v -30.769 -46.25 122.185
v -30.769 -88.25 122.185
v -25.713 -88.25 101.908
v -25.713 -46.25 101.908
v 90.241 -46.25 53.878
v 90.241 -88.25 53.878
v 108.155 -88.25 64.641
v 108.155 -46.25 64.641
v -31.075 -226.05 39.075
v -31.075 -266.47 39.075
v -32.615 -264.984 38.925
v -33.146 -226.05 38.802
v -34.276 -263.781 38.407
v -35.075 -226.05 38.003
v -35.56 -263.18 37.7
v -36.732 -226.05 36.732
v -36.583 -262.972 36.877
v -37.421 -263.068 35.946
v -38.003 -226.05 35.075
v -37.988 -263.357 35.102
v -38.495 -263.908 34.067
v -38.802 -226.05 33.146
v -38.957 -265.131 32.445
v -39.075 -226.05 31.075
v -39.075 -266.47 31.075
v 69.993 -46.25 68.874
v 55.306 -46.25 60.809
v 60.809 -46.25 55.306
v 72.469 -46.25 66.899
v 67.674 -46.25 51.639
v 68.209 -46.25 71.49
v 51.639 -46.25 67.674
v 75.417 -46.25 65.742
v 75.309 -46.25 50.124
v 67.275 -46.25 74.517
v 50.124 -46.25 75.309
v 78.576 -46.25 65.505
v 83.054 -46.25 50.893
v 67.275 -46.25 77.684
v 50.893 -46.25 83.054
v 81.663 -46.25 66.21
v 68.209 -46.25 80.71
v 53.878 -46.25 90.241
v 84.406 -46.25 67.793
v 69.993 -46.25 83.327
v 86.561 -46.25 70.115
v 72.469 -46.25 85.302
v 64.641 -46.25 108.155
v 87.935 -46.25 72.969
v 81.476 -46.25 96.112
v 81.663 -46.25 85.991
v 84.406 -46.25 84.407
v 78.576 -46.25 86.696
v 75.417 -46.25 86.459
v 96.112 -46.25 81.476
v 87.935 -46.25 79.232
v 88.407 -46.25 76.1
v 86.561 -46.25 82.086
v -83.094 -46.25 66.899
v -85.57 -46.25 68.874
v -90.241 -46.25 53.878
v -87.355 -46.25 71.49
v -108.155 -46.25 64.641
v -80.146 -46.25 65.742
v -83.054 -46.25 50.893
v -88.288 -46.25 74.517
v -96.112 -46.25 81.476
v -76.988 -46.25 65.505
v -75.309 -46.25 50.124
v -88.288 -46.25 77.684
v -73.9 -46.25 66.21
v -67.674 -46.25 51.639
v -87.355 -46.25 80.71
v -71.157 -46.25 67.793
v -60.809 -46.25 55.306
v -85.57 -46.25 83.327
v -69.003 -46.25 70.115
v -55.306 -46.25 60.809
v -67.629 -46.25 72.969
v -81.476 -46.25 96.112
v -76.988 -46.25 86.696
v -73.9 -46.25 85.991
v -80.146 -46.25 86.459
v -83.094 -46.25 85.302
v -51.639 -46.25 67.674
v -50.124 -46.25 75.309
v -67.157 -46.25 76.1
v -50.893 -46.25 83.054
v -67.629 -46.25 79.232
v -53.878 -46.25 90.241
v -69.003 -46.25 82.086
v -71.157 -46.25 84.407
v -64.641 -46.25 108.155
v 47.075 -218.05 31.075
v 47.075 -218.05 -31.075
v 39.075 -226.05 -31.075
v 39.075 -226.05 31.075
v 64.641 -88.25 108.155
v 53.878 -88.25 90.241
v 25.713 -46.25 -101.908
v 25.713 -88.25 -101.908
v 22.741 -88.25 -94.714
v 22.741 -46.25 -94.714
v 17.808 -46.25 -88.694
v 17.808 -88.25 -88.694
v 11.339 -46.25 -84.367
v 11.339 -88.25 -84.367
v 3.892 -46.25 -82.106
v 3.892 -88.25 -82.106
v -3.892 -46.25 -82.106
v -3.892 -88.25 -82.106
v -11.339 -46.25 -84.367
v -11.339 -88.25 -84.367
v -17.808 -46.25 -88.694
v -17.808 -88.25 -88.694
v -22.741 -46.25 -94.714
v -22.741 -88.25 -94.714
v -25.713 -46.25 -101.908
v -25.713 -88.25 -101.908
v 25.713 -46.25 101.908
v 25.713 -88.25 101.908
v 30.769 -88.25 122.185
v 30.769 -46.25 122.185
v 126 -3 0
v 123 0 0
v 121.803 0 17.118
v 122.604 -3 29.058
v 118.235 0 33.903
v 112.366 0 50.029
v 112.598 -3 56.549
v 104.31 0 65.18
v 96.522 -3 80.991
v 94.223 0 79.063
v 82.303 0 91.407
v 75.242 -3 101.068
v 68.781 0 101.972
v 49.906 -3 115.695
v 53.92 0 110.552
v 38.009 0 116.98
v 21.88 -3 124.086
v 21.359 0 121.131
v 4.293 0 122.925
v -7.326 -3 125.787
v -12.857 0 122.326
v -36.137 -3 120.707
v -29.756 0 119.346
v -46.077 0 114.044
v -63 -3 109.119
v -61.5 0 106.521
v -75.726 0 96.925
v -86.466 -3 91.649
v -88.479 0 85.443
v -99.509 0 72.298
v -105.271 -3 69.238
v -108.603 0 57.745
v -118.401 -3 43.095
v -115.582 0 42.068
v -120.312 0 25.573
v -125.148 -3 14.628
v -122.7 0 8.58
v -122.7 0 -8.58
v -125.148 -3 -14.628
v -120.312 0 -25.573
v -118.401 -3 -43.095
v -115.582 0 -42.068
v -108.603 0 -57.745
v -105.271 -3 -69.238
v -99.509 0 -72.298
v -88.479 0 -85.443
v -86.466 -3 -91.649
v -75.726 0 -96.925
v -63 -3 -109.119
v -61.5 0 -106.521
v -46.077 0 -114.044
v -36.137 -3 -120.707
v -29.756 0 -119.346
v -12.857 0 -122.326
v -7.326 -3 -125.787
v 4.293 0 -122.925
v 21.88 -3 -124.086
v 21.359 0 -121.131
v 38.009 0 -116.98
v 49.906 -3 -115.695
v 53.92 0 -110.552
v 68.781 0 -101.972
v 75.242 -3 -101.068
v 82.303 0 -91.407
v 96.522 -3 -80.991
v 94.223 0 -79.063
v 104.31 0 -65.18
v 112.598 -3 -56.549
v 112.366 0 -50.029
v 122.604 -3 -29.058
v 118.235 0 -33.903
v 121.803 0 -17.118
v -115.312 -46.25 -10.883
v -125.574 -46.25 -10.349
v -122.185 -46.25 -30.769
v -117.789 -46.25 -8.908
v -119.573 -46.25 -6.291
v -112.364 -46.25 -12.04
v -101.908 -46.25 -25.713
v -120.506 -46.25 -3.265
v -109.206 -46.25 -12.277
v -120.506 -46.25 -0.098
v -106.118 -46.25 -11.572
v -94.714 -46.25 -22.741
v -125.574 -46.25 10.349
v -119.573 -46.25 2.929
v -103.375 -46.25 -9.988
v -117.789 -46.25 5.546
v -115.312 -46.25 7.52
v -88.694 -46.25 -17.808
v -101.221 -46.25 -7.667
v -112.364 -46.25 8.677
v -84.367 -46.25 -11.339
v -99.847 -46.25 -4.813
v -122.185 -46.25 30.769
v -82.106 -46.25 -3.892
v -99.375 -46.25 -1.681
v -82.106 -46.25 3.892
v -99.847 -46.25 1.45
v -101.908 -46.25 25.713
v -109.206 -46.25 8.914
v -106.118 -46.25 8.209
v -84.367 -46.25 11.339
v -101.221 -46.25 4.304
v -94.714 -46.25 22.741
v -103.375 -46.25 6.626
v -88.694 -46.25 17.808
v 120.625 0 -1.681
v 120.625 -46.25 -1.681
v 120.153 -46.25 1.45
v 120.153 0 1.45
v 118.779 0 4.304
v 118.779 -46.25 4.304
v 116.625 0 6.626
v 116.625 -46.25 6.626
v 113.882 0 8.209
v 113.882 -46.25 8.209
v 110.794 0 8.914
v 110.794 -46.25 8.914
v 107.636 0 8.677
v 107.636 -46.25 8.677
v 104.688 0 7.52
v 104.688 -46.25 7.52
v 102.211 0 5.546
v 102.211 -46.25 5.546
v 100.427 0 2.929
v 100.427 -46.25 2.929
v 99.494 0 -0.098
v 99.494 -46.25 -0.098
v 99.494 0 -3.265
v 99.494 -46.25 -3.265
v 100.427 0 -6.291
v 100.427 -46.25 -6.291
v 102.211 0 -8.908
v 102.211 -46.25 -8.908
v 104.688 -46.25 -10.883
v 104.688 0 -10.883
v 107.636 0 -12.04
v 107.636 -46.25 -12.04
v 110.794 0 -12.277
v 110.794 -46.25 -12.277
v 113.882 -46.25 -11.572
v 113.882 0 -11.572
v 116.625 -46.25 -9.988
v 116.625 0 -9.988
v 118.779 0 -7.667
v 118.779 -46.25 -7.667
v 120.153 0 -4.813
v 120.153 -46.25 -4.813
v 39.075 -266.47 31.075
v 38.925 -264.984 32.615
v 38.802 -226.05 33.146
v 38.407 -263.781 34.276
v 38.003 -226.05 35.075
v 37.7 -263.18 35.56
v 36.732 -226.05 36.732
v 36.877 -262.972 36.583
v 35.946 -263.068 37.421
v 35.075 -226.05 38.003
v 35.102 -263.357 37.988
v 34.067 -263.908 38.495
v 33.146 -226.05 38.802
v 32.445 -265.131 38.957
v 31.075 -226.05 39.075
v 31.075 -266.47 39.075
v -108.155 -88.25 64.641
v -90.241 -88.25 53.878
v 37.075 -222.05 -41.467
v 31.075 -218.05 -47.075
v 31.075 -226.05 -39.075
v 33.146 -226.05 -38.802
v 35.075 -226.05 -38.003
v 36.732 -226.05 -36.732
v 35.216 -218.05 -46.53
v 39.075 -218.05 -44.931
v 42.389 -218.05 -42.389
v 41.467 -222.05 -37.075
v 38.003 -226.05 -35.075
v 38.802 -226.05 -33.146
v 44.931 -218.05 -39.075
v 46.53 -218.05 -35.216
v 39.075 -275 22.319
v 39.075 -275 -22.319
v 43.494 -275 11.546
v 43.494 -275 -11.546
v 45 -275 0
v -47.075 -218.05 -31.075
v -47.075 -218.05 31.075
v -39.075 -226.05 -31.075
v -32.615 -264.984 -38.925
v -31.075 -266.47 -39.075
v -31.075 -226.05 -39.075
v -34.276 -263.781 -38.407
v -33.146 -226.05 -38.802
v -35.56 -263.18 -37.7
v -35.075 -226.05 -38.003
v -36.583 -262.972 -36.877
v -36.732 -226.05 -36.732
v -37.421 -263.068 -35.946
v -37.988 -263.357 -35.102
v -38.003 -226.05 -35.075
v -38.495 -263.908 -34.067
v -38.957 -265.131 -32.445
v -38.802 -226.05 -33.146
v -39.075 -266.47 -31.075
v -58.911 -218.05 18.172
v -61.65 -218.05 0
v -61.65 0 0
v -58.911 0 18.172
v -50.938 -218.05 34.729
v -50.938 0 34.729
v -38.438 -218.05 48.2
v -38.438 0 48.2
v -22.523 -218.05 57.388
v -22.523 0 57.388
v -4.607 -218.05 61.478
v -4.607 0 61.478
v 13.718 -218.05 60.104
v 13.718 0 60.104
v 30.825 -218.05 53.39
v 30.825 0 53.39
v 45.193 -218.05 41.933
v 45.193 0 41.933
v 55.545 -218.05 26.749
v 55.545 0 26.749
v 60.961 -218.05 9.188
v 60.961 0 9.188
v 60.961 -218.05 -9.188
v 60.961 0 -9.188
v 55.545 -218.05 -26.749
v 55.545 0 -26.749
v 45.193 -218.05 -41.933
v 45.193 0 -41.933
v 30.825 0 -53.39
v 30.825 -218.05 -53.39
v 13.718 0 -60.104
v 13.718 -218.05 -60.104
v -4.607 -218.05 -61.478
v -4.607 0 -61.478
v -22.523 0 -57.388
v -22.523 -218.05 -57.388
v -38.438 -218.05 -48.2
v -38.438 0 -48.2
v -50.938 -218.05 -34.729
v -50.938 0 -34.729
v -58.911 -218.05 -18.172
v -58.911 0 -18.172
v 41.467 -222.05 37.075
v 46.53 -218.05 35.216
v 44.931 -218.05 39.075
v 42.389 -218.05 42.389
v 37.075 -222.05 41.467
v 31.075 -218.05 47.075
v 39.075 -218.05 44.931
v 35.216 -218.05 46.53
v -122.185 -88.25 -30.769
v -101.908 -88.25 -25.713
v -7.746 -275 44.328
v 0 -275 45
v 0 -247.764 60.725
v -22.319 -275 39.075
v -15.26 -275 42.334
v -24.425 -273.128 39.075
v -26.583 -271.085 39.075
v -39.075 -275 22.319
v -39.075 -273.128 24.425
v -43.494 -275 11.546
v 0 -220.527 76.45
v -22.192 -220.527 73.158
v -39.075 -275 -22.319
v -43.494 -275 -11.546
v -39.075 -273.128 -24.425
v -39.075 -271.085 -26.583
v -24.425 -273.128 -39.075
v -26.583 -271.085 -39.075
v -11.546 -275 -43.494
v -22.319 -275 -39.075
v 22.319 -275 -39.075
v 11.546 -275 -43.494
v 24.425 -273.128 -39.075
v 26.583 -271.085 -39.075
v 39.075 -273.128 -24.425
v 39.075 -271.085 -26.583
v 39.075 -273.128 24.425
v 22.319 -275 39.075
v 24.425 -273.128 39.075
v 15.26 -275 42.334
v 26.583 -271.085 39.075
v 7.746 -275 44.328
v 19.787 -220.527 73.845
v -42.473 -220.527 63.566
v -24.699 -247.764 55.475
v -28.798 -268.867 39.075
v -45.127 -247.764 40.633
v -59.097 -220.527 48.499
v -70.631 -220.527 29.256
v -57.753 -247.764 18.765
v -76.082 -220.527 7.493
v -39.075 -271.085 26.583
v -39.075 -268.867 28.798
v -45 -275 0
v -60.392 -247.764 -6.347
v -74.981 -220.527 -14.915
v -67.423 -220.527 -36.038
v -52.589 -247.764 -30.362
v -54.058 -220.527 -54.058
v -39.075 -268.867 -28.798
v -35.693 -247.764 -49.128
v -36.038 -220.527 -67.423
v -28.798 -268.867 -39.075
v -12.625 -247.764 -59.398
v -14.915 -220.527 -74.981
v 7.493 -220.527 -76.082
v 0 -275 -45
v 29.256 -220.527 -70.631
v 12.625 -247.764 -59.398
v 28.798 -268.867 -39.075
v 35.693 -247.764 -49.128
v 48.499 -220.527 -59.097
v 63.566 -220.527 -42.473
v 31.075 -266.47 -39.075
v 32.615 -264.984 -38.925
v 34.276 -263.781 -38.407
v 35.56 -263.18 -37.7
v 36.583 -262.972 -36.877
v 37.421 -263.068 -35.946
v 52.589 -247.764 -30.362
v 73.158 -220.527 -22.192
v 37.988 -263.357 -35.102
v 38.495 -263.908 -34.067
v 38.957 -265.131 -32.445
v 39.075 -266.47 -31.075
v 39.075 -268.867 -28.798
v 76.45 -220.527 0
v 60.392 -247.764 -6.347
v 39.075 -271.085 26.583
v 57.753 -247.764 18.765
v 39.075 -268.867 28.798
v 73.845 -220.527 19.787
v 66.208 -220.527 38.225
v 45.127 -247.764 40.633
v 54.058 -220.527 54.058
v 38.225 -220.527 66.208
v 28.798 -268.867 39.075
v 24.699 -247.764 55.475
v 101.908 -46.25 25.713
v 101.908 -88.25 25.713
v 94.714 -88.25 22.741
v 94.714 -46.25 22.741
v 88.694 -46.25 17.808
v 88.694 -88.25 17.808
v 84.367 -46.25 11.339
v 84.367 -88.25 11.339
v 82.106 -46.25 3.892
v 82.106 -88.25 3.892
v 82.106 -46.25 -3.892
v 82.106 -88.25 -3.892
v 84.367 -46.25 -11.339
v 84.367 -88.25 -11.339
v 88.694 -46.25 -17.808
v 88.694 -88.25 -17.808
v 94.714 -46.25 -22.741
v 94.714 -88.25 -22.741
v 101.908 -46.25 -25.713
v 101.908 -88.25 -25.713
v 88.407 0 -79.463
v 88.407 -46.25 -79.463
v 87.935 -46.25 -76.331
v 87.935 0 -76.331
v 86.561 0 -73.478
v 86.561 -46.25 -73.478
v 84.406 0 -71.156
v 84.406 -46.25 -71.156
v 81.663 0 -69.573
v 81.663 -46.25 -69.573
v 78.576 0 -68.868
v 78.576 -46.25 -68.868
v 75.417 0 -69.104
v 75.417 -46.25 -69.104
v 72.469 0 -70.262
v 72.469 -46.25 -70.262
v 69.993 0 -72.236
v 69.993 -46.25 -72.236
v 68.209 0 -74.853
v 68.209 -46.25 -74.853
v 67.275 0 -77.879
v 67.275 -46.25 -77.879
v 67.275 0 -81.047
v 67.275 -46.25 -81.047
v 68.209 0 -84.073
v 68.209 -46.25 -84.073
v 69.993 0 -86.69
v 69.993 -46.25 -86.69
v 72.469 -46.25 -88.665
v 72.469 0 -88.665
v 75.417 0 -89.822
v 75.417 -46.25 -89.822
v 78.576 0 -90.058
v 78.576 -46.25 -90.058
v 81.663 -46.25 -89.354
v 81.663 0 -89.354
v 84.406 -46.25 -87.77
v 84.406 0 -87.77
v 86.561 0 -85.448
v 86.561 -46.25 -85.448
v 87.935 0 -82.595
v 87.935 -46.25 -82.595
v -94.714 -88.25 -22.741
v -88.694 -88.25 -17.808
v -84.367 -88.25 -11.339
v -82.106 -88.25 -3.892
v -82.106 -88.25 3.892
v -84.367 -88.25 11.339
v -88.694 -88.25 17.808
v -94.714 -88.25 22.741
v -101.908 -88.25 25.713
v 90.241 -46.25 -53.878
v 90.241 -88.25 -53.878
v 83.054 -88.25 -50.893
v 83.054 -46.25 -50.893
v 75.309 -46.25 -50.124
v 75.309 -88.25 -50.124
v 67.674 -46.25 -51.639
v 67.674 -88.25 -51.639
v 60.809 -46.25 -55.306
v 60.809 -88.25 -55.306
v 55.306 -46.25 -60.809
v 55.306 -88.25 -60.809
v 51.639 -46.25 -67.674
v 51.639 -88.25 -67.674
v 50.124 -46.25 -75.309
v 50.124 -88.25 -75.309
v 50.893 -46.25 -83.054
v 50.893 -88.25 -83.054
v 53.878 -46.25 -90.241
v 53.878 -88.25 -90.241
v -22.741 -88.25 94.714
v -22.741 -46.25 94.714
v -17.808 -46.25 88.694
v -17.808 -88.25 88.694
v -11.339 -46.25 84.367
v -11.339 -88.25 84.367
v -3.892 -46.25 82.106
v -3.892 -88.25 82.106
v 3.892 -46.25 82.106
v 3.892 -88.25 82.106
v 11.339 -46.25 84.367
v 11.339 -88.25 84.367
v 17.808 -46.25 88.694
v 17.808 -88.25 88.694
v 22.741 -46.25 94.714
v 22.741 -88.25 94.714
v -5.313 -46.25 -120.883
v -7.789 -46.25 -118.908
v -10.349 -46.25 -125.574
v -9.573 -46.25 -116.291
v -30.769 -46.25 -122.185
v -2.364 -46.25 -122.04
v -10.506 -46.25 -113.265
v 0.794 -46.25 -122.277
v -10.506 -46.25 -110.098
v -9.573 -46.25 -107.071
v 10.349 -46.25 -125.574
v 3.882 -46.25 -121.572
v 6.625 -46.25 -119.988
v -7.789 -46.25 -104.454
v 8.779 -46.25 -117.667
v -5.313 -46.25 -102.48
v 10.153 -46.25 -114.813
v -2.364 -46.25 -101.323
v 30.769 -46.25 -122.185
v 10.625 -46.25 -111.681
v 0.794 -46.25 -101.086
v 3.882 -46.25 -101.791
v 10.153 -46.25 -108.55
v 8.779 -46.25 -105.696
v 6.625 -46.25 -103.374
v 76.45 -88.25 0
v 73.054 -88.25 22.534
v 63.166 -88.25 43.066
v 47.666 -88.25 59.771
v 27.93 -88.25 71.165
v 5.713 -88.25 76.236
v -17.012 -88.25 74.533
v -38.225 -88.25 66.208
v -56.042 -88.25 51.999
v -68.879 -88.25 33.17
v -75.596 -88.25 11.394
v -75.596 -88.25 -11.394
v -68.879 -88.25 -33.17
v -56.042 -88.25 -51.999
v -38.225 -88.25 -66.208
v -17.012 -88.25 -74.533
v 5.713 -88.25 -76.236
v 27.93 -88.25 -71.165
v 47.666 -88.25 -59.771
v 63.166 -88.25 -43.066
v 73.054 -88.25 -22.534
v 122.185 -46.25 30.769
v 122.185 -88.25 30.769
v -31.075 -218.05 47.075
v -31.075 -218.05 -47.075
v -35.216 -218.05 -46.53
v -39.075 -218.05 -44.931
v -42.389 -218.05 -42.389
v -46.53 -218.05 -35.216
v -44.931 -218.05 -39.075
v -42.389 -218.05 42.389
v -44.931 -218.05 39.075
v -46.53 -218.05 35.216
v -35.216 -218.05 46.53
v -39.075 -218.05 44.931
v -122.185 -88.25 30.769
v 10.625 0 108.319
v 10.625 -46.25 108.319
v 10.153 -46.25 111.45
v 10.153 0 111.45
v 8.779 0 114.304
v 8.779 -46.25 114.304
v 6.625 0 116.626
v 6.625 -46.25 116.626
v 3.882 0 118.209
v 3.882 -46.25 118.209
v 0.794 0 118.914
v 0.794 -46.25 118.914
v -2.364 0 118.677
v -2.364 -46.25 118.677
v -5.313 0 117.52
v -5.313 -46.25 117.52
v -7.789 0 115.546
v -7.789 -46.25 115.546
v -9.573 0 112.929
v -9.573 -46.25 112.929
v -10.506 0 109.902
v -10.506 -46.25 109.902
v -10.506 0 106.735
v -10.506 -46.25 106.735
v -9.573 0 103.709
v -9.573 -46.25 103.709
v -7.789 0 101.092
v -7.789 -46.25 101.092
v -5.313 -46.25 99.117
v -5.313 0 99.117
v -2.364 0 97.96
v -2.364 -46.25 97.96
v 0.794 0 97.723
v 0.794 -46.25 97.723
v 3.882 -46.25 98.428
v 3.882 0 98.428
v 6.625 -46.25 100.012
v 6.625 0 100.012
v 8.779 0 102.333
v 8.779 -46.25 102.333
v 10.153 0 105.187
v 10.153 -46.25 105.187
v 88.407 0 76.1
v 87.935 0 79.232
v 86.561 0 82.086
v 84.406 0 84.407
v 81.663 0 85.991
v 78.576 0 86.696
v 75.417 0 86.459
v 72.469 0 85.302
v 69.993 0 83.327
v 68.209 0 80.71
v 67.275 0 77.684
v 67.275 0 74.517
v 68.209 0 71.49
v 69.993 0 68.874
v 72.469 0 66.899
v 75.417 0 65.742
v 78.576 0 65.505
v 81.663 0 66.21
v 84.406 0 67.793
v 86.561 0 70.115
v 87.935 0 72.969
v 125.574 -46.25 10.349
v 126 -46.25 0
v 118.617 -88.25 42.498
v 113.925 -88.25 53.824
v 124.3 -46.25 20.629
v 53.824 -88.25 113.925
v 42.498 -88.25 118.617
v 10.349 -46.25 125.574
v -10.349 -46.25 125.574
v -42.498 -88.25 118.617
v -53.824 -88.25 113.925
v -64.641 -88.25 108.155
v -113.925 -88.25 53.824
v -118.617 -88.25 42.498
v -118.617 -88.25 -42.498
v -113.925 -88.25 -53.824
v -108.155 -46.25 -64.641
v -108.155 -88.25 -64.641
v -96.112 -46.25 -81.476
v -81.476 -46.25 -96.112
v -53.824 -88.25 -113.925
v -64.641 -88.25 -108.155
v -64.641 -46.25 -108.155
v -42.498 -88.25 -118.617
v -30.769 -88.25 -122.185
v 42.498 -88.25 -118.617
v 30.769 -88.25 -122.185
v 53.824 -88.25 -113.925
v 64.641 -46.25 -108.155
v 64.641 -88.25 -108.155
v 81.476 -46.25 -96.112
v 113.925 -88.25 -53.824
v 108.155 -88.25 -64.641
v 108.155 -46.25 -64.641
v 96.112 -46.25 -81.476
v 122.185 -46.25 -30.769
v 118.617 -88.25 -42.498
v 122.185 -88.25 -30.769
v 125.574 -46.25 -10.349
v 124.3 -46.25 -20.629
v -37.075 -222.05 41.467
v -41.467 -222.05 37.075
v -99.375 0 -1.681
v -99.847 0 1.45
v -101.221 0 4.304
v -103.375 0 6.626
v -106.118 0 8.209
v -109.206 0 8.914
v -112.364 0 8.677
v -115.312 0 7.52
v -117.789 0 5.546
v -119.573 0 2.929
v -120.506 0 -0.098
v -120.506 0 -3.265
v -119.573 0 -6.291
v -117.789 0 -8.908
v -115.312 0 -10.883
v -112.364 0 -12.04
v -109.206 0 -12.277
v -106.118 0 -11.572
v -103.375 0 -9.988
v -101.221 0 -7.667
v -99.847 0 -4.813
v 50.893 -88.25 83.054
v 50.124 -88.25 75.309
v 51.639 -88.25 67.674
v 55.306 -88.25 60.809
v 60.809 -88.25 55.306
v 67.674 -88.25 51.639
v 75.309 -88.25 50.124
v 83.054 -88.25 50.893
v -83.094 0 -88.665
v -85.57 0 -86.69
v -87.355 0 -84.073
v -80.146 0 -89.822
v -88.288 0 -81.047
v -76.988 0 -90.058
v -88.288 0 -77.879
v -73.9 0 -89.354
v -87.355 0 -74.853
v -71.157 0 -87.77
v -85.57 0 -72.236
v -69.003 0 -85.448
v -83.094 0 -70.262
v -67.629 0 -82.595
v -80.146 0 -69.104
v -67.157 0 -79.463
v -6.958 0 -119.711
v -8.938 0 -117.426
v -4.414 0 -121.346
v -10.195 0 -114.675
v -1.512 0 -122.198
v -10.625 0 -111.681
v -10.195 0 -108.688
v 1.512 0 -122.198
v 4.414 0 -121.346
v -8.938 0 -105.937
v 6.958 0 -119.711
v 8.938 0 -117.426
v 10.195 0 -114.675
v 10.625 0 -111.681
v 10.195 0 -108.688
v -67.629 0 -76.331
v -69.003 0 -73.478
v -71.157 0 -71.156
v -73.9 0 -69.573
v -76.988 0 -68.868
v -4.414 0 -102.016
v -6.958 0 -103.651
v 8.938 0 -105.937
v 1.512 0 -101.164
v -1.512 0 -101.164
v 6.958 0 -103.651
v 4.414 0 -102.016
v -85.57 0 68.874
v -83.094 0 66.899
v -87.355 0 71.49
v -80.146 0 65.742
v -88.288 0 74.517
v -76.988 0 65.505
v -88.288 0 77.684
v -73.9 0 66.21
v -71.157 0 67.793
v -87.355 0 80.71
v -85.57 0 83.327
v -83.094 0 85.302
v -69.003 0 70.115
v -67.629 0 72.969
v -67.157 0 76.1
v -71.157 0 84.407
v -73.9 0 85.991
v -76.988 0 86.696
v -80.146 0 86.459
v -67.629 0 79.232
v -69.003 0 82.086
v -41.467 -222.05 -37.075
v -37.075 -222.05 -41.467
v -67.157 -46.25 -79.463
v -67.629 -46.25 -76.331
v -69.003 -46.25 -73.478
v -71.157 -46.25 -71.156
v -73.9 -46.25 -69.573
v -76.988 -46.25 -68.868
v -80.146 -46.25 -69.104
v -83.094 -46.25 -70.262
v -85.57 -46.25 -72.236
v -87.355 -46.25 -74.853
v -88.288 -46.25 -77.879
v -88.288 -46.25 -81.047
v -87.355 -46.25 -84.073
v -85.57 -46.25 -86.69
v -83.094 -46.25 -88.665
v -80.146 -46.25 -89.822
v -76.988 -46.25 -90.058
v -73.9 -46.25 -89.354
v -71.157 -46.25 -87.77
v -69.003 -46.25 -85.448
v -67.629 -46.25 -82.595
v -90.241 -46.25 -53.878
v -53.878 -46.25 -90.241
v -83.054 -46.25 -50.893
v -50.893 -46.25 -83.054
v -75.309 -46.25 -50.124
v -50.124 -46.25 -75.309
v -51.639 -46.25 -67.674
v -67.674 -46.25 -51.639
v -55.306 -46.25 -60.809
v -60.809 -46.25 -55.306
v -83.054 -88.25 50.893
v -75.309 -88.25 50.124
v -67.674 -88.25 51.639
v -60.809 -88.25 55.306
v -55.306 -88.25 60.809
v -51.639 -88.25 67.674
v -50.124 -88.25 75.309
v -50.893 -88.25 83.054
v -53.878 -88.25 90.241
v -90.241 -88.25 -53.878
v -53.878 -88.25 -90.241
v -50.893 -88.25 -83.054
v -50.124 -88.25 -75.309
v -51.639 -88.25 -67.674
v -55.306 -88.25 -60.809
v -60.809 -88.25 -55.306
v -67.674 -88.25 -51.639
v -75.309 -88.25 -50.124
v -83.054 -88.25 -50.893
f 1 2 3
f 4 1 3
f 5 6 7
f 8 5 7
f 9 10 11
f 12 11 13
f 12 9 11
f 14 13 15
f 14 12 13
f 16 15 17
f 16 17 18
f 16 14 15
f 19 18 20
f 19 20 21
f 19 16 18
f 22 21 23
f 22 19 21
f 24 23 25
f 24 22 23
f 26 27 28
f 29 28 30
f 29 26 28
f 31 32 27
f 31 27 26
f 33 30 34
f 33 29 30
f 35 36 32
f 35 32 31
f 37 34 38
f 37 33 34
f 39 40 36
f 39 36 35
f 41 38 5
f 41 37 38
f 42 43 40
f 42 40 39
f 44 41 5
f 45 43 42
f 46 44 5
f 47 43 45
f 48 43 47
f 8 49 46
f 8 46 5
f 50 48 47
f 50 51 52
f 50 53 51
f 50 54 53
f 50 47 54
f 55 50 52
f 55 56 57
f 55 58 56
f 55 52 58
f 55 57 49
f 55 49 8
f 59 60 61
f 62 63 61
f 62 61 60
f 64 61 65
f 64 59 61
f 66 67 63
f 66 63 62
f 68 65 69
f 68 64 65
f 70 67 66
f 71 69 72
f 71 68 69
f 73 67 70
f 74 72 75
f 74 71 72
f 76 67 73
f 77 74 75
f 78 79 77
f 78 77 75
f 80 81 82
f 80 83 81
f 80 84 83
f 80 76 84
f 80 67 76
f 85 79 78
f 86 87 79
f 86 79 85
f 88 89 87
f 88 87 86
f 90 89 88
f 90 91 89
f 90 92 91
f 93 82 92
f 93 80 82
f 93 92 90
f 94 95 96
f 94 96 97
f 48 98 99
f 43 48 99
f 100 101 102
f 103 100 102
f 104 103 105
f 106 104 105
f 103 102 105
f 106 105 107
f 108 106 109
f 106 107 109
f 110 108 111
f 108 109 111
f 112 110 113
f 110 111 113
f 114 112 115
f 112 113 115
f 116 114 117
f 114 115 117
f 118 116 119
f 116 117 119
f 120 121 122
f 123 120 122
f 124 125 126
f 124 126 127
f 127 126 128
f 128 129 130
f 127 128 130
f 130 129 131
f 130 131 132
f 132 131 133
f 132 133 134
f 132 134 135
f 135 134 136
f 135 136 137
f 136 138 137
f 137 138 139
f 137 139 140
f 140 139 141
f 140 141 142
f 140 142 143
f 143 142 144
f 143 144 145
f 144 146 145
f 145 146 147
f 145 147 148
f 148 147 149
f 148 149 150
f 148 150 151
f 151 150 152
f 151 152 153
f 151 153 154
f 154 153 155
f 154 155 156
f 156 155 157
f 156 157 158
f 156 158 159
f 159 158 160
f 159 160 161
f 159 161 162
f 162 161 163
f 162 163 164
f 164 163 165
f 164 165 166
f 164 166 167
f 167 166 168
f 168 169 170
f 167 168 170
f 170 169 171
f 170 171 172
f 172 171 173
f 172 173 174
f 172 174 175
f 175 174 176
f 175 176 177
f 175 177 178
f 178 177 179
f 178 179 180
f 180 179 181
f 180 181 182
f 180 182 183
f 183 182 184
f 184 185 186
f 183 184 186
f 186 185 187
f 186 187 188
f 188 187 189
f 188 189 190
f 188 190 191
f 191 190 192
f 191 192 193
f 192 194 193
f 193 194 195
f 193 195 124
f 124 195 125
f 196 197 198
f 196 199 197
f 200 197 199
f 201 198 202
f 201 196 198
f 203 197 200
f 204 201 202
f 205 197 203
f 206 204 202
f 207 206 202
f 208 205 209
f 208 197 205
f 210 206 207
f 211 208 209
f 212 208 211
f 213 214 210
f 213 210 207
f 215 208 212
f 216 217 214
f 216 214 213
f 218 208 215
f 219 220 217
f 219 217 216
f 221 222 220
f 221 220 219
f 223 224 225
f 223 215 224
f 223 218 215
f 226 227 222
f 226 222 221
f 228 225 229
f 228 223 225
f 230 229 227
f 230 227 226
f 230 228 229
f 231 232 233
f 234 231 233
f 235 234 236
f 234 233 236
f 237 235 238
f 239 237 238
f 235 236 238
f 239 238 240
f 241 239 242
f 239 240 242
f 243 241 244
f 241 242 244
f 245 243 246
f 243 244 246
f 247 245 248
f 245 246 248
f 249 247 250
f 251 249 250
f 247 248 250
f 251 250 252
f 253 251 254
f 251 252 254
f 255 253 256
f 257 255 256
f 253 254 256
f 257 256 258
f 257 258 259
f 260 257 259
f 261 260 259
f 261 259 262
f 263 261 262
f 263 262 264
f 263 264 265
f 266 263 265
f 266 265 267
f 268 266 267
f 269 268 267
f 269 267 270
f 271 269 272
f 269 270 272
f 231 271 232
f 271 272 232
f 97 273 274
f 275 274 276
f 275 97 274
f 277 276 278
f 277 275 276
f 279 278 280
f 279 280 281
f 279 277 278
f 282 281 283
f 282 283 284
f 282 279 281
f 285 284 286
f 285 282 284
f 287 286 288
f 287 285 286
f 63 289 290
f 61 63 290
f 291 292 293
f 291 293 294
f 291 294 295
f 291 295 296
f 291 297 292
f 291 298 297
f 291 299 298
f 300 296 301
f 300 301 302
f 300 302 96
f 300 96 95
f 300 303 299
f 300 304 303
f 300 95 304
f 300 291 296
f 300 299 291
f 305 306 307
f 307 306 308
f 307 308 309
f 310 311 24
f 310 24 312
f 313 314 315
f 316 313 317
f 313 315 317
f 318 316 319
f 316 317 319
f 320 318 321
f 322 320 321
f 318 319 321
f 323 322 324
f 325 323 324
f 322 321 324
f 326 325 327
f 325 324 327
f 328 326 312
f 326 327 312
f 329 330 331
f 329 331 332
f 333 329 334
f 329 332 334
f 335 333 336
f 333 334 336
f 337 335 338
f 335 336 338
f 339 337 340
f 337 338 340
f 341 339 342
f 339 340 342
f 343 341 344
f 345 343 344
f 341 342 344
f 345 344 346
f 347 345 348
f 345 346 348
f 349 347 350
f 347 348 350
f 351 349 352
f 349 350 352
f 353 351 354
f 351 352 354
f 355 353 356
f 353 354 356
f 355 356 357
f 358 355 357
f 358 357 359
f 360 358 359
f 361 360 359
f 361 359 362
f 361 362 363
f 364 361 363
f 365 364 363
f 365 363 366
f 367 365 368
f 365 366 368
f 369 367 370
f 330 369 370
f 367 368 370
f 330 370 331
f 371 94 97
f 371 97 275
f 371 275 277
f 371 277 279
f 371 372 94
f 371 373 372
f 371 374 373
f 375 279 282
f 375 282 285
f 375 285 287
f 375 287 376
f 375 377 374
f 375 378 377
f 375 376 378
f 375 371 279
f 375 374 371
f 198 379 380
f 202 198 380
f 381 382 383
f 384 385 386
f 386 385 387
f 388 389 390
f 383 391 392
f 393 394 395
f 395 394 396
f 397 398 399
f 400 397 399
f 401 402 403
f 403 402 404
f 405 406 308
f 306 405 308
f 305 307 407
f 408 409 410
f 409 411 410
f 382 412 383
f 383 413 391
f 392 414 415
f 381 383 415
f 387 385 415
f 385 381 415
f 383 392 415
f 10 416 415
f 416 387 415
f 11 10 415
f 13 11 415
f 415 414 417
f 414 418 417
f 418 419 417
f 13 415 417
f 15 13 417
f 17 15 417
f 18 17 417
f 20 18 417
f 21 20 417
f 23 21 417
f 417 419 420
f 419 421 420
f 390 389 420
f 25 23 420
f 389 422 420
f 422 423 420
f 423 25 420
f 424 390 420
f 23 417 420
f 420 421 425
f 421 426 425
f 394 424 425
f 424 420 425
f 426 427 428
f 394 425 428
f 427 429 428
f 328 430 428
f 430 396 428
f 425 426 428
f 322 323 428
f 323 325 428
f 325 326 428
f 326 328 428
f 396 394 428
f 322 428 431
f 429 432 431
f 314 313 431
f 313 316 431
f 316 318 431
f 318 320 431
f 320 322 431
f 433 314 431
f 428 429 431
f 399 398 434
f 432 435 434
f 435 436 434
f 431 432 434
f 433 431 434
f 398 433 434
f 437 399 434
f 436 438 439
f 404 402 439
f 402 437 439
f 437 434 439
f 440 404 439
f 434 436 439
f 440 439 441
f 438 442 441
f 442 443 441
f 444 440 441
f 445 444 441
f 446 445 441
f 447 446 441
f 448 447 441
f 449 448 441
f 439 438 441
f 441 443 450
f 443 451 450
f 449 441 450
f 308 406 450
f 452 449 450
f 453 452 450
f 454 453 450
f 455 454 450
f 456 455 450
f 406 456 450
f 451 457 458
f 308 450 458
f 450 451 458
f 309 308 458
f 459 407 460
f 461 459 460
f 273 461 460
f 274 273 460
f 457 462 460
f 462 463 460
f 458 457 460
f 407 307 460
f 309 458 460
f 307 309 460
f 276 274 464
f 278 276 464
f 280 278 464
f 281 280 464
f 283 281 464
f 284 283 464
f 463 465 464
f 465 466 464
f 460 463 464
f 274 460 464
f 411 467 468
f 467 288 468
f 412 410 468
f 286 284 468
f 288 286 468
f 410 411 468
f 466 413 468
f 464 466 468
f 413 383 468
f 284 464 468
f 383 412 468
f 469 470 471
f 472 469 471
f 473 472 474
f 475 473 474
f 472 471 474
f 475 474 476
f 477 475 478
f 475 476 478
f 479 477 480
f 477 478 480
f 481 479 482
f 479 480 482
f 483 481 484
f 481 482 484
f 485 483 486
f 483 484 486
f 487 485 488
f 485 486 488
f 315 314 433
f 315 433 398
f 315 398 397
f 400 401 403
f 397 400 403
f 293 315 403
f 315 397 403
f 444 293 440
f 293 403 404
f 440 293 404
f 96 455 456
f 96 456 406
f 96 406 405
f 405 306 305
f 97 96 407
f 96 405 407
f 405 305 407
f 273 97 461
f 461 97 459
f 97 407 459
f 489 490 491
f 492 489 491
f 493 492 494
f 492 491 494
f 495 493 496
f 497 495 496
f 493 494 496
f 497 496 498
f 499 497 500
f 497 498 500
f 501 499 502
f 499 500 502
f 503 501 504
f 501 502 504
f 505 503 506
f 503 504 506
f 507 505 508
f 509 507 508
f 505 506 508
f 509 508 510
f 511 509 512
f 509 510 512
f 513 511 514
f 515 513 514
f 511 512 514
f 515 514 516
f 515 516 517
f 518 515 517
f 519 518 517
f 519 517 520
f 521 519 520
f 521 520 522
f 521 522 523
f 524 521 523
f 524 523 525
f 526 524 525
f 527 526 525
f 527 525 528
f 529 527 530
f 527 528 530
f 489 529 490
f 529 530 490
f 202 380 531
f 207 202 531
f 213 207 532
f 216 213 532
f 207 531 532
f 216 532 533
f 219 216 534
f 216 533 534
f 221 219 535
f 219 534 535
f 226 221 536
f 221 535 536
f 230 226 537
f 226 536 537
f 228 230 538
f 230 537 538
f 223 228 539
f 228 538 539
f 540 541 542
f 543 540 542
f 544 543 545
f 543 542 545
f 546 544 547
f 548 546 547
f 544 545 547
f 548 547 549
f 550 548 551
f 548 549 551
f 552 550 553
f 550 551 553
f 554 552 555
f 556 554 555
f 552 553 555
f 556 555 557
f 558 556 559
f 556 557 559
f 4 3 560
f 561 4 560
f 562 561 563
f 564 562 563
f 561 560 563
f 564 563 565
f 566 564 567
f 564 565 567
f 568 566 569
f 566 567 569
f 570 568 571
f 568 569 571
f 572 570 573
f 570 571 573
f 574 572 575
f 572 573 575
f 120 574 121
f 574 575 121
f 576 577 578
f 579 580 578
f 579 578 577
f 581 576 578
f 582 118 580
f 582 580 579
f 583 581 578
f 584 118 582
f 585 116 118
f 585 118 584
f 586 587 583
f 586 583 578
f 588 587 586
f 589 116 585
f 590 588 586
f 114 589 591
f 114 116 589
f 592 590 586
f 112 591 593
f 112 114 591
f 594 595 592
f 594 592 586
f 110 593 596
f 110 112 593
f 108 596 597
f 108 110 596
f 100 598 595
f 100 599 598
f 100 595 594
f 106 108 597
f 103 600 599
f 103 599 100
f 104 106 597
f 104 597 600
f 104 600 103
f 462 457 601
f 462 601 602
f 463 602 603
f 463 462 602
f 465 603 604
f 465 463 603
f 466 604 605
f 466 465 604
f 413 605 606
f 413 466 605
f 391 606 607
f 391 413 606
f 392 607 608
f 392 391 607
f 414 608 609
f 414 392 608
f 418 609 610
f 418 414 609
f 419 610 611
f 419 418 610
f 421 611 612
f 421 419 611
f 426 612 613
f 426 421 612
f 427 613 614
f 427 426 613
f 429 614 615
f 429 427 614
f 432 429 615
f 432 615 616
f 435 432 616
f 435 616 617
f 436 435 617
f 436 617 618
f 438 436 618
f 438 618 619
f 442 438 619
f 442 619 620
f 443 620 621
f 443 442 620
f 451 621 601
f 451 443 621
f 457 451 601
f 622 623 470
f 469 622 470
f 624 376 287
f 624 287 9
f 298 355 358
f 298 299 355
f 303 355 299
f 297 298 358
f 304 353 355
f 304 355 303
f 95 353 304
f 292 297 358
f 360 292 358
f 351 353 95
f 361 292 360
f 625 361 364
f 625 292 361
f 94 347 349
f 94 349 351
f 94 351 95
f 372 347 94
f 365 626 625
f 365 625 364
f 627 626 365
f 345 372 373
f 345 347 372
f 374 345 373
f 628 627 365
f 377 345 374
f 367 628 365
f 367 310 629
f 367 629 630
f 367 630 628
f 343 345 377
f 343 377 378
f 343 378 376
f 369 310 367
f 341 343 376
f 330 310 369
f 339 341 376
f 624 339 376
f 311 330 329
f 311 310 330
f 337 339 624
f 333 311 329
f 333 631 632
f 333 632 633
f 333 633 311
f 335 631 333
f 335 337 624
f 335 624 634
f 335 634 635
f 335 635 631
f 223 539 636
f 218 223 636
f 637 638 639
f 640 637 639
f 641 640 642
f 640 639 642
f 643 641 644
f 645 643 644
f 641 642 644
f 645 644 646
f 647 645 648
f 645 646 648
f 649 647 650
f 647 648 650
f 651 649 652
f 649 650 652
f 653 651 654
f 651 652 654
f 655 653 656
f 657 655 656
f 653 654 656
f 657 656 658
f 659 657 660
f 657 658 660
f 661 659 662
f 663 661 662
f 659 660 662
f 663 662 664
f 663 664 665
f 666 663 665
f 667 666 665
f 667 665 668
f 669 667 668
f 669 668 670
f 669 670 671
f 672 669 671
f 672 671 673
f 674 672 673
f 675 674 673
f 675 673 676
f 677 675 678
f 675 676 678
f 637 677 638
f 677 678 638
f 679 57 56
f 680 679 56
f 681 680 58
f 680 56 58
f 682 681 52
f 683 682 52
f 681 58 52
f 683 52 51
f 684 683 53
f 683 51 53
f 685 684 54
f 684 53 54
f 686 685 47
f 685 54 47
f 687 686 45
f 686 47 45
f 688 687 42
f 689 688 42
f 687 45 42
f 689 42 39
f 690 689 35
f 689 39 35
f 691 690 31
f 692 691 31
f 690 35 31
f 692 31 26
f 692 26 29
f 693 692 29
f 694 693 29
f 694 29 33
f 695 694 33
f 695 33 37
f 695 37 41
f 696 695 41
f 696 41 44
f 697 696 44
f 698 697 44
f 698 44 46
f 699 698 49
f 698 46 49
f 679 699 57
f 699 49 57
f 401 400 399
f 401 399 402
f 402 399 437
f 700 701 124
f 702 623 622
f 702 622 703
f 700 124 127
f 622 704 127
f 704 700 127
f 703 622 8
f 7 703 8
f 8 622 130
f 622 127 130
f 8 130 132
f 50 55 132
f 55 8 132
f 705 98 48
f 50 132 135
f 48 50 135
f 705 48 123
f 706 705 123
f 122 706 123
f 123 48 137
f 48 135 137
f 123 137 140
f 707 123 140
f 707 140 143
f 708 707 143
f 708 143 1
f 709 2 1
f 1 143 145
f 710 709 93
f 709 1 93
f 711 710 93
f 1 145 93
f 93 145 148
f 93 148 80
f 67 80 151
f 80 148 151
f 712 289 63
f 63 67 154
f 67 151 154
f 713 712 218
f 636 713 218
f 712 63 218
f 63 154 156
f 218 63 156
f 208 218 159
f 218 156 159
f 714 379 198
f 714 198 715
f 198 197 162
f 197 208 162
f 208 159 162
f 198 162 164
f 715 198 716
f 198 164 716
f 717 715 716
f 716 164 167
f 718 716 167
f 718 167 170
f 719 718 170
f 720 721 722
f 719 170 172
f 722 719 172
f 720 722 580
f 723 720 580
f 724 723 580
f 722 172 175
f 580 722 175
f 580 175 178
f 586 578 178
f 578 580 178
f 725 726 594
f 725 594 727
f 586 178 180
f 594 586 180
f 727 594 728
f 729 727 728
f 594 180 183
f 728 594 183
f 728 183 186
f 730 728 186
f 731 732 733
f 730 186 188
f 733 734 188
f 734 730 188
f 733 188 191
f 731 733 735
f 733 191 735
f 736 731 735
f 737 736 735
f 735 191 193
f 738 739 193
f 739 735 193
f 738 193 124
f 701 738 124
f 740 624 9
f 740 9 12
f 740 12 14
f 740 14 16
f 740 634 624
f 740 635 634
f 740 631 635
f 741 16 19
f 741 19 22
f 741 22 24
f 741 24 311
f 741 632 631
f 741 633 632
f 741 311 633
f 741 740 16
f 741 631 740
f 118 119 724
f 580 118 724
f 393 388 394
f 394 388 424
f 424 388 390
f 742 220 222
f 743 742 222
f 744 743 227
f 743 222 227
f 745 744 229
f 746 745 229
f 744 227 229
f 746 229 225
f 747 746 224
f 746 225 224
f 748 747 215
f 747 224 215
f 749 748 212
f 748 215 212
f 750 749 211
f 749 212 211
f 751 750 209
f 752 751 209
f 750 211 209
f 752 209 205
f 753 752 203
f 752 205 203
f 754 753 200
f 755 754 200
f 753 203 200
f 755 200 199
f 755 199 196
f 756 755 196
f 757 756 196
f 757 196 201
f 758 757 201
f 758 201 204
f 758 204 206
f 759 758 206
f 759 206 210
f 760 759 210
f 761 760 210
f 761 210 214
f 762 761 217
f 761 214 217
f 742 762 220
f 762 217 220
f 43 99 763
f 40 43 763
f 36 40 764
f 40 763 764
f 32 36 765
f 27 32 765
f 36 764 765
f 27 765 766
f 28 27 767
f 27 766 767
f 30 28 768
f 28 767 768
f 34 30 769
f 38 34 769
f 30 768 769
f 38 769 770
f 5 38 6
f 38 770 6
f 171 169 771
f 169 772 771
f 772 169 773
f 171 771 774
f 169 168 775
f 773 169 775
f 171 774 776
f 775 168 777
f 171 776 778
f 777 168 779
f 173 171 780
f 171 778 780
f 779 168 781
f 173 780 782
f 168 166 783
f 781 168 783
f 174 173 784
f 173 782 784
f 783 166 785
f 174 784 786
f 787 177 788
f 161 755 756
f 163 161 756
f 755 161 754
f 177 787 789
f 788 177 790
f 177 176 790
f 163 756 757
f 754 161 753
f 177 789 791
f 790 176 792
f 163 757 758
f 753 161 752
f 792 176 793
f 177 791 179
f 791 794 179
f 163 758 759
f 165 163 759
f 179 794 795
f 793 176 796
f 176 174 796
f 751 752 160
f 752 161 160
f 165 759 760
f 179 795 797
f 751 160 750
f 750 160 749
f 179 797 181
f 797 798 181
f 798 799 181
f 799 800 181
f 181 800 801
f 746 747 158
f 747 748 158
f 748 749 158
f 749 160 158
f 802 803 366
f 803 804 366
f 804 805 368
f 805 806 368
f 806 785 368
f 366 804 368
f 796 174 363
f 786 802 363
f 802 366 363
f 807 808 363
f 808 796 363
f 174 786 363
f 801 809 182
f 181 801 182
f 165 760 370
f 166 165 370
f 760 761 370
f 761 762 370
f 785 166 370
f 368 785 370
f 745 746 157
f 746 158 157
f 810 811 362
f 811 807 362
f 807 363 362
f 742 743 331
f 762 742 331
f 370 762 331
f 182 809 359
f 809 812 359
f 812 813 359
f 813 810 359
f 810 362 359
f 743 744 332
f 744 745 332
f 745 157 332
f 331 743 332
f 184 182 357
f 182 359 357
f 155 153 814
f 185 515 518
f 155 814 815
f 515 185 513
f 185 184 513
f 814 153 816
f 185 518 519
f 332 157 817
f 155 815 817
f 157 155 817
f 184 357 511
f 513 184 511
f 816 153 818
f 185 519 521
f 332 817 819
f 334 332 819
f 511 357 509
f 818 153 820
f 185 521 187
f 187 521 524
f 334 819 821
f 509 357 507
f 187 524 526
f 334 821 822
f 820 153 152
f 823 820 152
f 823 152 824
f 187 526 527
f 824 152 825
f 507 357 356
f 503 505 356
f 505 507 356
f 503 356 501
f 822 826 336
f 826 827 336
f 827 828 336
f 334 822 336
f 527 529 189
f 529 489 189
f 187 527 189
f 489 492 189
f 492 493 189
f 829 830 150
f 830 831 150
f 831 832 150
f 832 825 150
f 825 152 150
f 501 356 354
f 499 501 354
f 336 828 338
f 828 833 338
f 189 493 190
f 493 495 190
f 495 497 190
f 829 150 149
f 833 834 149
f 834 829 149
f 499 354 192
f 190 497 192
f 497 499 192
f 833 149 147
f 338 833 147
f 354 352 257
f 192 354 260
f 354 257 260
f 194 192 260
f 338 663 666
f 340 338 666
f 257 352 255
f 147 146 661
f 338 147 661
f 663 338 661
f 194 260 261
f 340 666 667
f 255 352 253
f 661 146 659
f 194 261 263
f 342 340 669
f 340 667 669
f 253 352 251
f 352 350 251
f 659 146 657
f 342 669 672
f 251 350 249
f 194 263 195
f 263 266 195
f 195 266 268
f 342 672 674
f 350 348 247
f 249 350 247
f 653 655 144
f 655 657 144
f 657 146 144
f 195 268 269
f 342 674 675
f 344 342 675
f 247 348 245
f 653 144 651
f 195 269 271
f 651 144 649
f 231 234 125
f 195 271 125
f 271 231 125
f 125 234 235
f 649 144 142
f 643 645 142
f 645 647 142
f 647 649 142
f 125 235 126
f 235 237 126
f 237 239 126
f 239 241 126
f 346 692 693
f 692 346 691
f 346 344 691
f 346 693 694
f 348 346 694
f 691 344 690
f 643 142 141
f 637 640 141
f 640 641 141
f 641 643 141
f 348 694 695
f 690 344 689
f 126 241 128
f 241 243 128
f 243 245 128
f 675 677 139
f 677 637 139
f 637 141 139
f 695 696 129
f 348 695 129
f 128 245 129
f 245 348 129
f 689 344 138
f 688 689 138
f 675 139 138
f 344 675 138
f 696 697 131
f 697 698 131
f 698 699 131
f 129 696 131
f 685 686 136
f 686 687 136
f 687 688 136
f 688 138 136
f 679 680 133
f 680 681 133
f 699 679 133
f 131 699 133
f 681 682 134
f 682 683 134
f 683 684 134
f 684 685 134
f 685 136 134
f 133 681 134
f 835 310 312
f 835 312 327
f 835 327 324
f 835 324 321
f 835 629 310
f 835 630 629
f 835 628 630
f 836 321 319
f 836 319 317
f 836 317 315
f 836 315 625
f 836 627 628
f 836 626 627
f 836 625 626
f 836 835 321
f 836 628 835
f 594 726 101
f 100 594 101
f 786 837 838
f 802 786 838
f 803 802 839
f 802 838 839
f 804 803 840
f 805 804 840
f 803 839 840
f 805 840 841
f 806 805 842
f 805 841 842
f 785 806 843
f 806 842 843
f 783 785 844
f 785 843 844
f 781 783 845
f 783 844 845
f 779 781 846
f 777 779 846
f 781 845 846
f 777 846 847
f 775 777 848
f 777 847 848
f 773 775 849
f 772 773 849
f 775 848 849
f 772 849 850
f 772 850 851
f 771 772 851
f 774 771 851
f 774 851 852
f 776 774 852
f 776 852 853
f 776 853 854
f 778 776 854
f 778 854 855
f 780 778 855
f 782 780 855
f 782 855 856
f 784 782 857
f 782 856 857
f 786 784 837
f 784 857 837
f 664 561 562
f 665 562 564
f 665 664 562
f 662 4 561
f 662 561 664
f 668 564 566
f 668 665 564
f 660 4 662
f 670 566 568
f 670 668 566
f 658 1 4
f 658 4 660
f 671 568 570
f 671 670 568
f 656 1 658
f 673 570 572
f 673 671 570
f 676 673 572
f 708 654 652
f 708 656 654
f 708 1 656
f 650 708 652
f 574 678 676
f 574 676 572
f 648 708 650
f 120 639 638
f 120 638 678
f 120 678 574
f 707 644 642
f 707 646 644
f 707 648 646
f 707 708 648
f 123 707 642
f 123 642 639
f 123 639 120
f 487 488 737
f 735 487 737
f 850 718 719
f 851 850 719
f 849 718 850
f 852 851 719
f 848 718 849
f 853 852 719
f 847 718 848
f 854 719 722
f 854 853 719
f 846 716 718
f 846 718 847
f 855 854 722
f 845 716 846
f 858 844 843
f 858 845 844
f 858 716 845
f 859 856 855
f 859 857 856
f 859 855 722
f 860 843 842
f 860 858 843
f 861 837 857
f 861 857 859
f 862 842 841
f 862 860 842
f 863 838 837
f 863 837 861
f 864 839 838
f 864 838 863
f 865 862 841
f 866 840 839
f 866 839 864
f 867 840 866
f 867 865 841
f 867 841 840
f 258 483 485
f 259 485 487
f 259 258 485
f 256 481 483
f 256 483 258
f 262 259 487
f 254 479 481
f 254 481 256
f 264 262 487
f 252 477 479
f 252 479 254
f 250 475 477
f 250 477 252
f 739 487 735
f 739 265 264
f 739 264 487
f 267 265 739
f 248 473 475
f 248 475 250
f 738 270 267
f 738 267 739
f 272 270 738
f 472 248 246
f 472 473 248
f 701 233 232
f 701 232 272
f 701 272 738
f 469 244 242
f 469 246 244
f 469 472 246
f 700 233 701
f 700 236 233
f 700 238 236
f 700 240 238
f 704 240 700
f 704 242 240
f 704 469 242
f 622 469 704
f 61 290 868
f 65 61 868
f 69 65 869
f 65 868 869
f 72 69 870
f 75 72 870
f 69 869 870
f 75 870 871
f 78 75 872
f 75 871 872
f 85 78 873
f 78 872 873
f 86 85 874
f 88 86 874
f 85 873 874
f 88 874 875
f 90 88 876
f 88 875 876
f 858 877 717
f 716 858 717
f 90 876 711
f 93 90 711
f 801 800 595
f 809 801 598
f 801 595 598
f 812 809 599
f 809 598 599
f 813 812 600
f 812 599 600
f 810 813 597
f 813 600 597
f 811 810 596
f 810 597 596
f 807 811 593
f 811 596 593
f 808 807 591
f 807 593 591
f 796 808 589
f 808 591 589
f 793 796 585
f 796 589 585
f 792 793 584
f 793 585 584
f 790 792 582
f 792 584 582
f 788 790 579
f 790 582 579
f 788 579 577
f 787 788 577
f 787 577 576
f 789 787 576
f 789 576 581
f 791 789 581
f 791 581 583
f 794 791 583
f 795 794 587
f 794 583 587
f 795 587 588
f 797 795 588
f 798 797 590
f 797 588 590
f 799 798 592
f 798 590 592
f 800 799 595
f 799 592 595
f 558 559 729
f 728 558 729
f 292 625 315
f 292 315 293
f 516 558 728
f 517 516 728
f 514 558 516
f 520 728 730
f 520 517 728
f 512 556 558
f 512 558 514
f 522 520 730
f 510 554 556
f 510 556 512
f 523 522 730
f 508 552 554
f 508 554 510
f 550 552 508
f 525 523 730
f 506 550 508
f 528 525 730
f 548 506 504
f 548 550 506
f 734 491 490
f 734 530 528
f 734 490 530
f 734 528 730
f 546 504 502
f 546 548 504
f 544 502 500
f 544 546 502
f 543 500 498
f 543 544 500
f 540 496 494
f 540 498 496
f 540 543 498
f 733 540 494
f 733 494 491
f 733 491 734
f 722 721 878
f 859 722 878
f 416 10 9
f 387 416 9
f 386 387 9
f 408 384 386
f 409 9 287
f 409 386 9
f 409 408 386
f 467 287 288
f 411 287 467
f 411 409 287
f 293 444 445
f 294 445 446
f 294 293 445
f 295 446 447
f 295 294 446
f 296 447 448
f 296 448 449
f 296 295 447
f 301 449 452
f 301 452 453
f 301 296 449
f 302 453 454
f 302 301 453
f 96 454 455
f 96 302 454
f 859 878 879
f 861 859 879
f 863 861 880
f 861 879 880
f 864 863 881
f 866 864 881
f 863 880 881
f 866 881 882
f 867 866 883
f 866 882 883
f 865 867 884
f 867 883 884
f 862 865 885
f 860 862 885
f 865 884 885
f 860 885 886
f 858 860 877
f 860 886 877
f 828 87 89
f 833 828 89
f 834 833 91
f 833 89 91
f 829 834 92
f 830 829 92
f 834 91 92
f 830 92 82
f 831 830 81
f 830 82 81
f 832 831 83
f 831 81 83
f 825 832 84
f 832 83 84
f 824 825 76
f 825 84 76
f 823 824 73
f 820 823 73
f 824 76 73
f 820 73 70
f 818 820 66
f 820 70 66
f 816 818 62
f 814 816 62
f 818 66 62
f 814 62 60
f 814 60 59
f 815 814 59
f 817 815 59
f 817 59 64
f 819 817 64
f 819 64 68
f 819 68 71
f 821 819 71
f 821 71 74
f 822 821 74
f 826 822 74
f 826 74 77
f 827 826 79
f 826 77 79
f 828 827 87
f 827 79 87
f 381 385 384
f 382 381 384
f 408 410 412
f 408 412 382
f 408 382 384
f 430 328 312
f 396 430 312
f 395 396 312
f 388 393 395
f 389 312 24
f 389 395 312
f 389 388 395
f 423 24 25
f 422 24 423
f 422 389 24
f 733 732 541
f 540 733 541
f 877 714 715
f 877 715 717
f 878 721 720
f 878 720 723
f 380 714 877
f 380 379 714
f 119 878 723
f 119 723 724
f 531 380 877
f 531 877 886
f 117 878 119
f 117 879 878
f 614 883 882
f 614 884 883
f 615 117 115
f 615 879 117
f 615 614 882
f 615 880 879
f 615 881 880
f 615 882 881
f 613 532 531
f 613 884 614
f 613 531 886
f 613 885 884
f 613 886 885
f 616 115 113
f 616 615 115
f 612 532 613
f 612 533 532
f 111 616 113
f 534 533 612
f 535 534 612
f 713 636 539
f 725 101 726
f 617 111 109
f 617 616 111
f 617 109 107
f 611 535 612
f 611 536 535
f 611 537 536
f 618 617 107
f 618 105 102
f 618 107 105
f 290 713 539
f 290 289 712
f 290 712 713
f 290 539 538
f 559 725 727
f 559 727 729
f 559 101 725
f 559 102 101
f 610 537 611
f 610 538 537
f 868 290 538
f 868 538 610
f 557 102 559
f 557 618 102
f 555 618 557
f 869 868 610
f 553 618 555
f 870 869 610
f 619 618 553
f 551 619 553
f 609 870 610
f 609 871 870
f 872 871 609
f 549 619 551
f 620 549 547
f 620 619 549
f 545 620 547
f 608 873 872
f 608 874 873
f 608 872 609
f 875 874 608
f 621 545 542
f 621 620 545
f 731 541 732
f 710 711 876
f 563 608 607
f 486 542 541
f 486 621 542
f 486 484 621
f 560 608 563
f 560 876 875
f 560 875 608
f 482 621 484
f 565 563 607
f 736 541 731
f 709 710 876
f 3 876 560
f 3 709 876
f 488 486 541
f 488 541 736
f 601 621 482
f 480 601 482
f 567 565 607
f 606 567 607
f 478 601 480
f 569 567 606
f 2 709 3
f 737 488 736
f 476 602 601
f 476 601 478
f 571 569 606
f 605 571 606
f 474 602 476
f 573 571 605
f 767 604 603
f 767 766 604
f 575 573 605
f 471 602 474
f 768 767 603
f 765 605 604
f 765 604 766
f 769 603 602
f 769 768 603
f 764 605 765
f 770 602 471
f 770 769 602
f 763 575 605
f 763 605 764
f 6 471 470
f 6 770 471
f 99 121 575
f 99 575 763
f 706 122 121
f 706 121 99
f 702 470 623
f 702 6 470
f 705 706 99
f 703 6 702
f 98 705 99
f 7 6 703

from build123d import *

# Parameters (mm, degrees)
F0_R      = 126
F1_DEPTH  = 275
F2_R      = 126
F2_R_2    = 76.45
F3_DEPTH  = 186.75
F4_R      = 10.625
F5_DEPTH  = 25
F6_DEPTH  = 169
F8_DEPTH  = 42
F9_SIZE   = 3
F10_R     = 61.65
F11_DEPTH = 218.05
F14_W     = 78.15
F14_H     = 78.15
F15_DEPTH = 60
F16_R     = 8
F17_R     = 8
F18_R     = 8
F19_R     = 8
F20_SIZE  = 8


with BuildPart() as f1:
    # F0 (on Front) → F1 (new body)
    with BuildSketch(Plane.XZ):
        Circle(F0_R)
    extrude(amount=F1_DEPTH)

    # F2 (on face) → F3 (cut)
    with BuildSketch(Plane.XZ.offset(275)):
        Circle(F2_R)
        Circle(F2_R_2, mode=Mode.SUBTRACT)
    extrude(amount=-F3_DEPTH, mode=Mode.SUBTRACT)

    # F4 (on face) → F5 (cut)
    with BuildSketch(Plane.XZ.offset(88.25)):
        with Locations((0, 108.3187091187)):
            Circle(F4_R)
        with Locations((-77.7817459305, 76.1004550493)):
            Circle(F4_R)
        with Locations((-110, -1.6812908813)):
            Circle(F4_R)
        with Locations((-77.7817459305, -79.4630368118)):
            Circle(F4_R)
        with Locations((0, -111.6812908813)):
            Circle(F4_R)
        with Locations((77.7817459305, -79.4630368118)):
            Circle(F4_R)
        with Locations((110, -1.6812908813)):
            Circle(F4_R)
        with Locations((77.7817459305, 76.1004550493)):
            Circle(F4_R)
    extrude(amount=-F5_DEPTH, mode=Mode.SUBTRACT)

    # F4 (on face) → F6 (cut)
    with BuildSketch(Plane.XZ.offset(88.25)):
        with Locations((0, 108.3187091187)):
            Circle(F4_R)
        with Locations((-77.7817459305, 76.1004550493)):
            Circle(F4_R)
        with Locations((-110, -1.6812908813)):
            Circle(F4_R)
        with Locations((-77.7817459305, -79.4630368118)):
            Circle(F4_R)
        with Locations((0, -111.6812908813)):
            Circle(F4_R)
        with Locations((77.7817459305, -79.4630368118)):
            Circle(F4_R)
        with Locations((110, -1.6812908813)):
            Circle(F4_R)
        with Locations((77.7817459305, 76.1004550493)):
            Circle(F4_R)
    extrude(amount=-F6_DEPTH, mode=Mode.SUBTRACT)

    # F7 (on face) → F8 (cut)
    with BuildSketch(Plane.XZ.offset(88.25)):
        with BuildLine():
            Line((-36.7983387241, 146.3692988564), (-25.7128367463, 101.9077788854))
            ThreePointArc((-25.7128367463, 101.9077788854), (0, 81.8187091187), (25.7128367463, 101.9077788854))
            Line((25.7128367463, 101.9077788854), (36.7983387241, 146.3692988564))
            Line((36.7983387241, 146.3692988564), (-36.7983387241, 146.3692988564))
        make_face()
        with BuildLine():
            Line((-53.8779602786, 90.2414027324), (-77.4783689307, 129.5190786271))
            Line((-77.4783689307, 129.5190786271), (-129.5190786271, 77.4783689307))
            Line((-129.5190786271, 77.4783689307), (-90.2414027324, 53.8779602786))
            ThreePointArc((-90.2414027324, 53.8779602786), (-57.8545640458, 57.8545640458), (-53.8779602786, 90.2414027324))
        make_face()
        with BuildLine():
            Line((-101.9077788854, 25.7128367463), (-146.3692988564, 36.7983387241))
            Line((-146.3692988564, 36.7983387241), (-146.3692988564, -36.7983387241))
            Line((-146.3692988564, -36.7983387241), (-101.9077788854, -25.7128367463))
            ThreePointArc((-101.9077788854, -25.7128367463), (-81.8187091187, 0), (-101.9077788854, 25.7128367463))
        make_face()
        with BuildLine():
            Line((-90.2414027324, -53.8779602786), (-129.5190786271, -77.4783689307))
            Line((-129.5190786271, -77.4783689307), (-77.4783689307, -129.5190786271))
            Line((-77.4783689307, -129.5190786271), (-53.8779602786, -90.2414027324))
            ThreePointArc((-53.8779602786, -90.2414027324), (-57.8545640458, -57.8545640458), (-90.2414027324, -53.8779602786))
        make_face()
        with BuildLine():
            Line((-25.7128367463, -101.9077788854), (-36.7983387241, -146.3692988564))
            Line((-36.7983387241, -146.3692988564), (36.7983387241, -146.3692988564))
            Line((36.7983387241, -146.3692988564), (25.7128367463, -101.9077788854))
            ThreePointArc((25.7128367463, -101.9077788854), (0, -81.8187091187), (-25.7128367463, -101.9077788854))
        make_face()
        with BuildLine():
            Line((53.8779602786, -90.2414027324), (77.4783689307, -129.5190786271))
            Line((77.4783689307, -129.5190786271), (129.5190786271, -77.4783689307))
            Line((129.5190786271, -77.4783689307), (90.2414027324, -53.8779602786))
            ThreePointArc((90.2414027324, -53.8779602786), (57.8545640458, -57.8545640458), (53.8779602786, -90.2414027324))
        make_face()
        with BuildLine():
            Line((101.9077788854, -25.7128367463), (146.3692988564, -36.7983387241))
            Line((146.3692988564, -36.7983387241), (146.3692988564, 36.7983387241))
            Line((146.3692988564, 36.7983387241), (101.9077788854, 25.7128367463))
            ThreePointArc((101.9077788854, 25.7128367463), (81.8187091187, 0), (101.9077788854, -25.7128367463))
        make_face()
        with BuildLine():
            Line((90.2414027324, 53.8779602786), (129.5190786271, 77.4783689307))
            Line((129.5190786271, 77.4783689307), (77.4783689307, 129.5190786271))
            Line((77.4783689307, 129.5190786271), (53.8779602786, 90.2414027324))
            ThreePointArc((53.8779602786, 90.2414027324), (57.8545640458, 57.8545640458), (90.2414027324, 53.8779602786))
        make_face()
    extrude(amount=-F8_DEPTH, mode=Mode.SUBTRACT)

    # F9
    f9_edges = [f1.edges().sort_by_distance(p)[0] for p in [
        (-126, 0, 0),
    ]]
    chamfer(f9_edges, length=F9_SIZE)

    # F10 (on face) → F11 (cut)
    with BuildSketch(Plane(origin=(0, 0, 0), x_dir=(-1, 0, 0), z_dir=(0, 1, 0))):
        Circle(F10_R)
    extrude(amount=-F11_DEPTH, mode=Mode.SUBTRACT)

    # F12 (on Right) → F13 (revolve, cut)
    with BuildSketch(Plane.YZ):
        Polygon((-287.4912917614, 86.0934704542), (-275, 45), (-210.72777727, 82.1075850946), align=None)
    revolve(axis=Axis((0, -206.6095604543, 0), (0, -1, 0)), mode=Mode.SUBTRACT)

    # F14 (on face) → F15 (cut)
    with BuildSketch(Plane.XZ.offset(275)):
        Rectangle(F14_W, F14_H)
    extrude(amount=-F15_DEPTH, mode=Mode.SUBTRACT)

    # F16
    f16_edges = [f1.edges().sort_by_distance(p)[0] for p in [
        (-39.075, -237.639237, -39.075),
    ]]
    fillet(f16_edges, radius=F16_R)

    # F17
    f17_edges = [f1.edges().sort_by_distance(p)[0] for p in [
        (39.075, -237.639237, 39.075),
    ]]
    fillet(f17_edges, radius=F17_R)

    # F18
    f18_edges = [f1.edges().sort_by_distance(p)[0] for p in [
        (-39.075, -237.639237, 39.075),
    ]]
    fillet(f18_edges, radius=F18_R)

    # F19
    f19_edges = [f1.edges().sort_by_distance(p)[0] for p in [
        (39.075, -237.639237, -39.075),
    ]]
    fillet(f19_edges, radius=F19_R)

    # F20
    f20_edges = [f1.edges().sort_by_distance(p)[0] for p in [
        (-39.075, -218.05, 0),
        (-36.731854, -218.05, 36.731854),
        (0, -218.05, 39.075),
        (36.731854, -218.05, 36.731854),
        (39.075, -218.05, 0),
        (0, -218.05, -39.075),
        (-36.731854, -218.05, -36.731854),
        (36.731854, -218.05, -36.731854),
    ]]
    chamfer(f20_edges, length=F20_SIZE)


solid = f1.part
